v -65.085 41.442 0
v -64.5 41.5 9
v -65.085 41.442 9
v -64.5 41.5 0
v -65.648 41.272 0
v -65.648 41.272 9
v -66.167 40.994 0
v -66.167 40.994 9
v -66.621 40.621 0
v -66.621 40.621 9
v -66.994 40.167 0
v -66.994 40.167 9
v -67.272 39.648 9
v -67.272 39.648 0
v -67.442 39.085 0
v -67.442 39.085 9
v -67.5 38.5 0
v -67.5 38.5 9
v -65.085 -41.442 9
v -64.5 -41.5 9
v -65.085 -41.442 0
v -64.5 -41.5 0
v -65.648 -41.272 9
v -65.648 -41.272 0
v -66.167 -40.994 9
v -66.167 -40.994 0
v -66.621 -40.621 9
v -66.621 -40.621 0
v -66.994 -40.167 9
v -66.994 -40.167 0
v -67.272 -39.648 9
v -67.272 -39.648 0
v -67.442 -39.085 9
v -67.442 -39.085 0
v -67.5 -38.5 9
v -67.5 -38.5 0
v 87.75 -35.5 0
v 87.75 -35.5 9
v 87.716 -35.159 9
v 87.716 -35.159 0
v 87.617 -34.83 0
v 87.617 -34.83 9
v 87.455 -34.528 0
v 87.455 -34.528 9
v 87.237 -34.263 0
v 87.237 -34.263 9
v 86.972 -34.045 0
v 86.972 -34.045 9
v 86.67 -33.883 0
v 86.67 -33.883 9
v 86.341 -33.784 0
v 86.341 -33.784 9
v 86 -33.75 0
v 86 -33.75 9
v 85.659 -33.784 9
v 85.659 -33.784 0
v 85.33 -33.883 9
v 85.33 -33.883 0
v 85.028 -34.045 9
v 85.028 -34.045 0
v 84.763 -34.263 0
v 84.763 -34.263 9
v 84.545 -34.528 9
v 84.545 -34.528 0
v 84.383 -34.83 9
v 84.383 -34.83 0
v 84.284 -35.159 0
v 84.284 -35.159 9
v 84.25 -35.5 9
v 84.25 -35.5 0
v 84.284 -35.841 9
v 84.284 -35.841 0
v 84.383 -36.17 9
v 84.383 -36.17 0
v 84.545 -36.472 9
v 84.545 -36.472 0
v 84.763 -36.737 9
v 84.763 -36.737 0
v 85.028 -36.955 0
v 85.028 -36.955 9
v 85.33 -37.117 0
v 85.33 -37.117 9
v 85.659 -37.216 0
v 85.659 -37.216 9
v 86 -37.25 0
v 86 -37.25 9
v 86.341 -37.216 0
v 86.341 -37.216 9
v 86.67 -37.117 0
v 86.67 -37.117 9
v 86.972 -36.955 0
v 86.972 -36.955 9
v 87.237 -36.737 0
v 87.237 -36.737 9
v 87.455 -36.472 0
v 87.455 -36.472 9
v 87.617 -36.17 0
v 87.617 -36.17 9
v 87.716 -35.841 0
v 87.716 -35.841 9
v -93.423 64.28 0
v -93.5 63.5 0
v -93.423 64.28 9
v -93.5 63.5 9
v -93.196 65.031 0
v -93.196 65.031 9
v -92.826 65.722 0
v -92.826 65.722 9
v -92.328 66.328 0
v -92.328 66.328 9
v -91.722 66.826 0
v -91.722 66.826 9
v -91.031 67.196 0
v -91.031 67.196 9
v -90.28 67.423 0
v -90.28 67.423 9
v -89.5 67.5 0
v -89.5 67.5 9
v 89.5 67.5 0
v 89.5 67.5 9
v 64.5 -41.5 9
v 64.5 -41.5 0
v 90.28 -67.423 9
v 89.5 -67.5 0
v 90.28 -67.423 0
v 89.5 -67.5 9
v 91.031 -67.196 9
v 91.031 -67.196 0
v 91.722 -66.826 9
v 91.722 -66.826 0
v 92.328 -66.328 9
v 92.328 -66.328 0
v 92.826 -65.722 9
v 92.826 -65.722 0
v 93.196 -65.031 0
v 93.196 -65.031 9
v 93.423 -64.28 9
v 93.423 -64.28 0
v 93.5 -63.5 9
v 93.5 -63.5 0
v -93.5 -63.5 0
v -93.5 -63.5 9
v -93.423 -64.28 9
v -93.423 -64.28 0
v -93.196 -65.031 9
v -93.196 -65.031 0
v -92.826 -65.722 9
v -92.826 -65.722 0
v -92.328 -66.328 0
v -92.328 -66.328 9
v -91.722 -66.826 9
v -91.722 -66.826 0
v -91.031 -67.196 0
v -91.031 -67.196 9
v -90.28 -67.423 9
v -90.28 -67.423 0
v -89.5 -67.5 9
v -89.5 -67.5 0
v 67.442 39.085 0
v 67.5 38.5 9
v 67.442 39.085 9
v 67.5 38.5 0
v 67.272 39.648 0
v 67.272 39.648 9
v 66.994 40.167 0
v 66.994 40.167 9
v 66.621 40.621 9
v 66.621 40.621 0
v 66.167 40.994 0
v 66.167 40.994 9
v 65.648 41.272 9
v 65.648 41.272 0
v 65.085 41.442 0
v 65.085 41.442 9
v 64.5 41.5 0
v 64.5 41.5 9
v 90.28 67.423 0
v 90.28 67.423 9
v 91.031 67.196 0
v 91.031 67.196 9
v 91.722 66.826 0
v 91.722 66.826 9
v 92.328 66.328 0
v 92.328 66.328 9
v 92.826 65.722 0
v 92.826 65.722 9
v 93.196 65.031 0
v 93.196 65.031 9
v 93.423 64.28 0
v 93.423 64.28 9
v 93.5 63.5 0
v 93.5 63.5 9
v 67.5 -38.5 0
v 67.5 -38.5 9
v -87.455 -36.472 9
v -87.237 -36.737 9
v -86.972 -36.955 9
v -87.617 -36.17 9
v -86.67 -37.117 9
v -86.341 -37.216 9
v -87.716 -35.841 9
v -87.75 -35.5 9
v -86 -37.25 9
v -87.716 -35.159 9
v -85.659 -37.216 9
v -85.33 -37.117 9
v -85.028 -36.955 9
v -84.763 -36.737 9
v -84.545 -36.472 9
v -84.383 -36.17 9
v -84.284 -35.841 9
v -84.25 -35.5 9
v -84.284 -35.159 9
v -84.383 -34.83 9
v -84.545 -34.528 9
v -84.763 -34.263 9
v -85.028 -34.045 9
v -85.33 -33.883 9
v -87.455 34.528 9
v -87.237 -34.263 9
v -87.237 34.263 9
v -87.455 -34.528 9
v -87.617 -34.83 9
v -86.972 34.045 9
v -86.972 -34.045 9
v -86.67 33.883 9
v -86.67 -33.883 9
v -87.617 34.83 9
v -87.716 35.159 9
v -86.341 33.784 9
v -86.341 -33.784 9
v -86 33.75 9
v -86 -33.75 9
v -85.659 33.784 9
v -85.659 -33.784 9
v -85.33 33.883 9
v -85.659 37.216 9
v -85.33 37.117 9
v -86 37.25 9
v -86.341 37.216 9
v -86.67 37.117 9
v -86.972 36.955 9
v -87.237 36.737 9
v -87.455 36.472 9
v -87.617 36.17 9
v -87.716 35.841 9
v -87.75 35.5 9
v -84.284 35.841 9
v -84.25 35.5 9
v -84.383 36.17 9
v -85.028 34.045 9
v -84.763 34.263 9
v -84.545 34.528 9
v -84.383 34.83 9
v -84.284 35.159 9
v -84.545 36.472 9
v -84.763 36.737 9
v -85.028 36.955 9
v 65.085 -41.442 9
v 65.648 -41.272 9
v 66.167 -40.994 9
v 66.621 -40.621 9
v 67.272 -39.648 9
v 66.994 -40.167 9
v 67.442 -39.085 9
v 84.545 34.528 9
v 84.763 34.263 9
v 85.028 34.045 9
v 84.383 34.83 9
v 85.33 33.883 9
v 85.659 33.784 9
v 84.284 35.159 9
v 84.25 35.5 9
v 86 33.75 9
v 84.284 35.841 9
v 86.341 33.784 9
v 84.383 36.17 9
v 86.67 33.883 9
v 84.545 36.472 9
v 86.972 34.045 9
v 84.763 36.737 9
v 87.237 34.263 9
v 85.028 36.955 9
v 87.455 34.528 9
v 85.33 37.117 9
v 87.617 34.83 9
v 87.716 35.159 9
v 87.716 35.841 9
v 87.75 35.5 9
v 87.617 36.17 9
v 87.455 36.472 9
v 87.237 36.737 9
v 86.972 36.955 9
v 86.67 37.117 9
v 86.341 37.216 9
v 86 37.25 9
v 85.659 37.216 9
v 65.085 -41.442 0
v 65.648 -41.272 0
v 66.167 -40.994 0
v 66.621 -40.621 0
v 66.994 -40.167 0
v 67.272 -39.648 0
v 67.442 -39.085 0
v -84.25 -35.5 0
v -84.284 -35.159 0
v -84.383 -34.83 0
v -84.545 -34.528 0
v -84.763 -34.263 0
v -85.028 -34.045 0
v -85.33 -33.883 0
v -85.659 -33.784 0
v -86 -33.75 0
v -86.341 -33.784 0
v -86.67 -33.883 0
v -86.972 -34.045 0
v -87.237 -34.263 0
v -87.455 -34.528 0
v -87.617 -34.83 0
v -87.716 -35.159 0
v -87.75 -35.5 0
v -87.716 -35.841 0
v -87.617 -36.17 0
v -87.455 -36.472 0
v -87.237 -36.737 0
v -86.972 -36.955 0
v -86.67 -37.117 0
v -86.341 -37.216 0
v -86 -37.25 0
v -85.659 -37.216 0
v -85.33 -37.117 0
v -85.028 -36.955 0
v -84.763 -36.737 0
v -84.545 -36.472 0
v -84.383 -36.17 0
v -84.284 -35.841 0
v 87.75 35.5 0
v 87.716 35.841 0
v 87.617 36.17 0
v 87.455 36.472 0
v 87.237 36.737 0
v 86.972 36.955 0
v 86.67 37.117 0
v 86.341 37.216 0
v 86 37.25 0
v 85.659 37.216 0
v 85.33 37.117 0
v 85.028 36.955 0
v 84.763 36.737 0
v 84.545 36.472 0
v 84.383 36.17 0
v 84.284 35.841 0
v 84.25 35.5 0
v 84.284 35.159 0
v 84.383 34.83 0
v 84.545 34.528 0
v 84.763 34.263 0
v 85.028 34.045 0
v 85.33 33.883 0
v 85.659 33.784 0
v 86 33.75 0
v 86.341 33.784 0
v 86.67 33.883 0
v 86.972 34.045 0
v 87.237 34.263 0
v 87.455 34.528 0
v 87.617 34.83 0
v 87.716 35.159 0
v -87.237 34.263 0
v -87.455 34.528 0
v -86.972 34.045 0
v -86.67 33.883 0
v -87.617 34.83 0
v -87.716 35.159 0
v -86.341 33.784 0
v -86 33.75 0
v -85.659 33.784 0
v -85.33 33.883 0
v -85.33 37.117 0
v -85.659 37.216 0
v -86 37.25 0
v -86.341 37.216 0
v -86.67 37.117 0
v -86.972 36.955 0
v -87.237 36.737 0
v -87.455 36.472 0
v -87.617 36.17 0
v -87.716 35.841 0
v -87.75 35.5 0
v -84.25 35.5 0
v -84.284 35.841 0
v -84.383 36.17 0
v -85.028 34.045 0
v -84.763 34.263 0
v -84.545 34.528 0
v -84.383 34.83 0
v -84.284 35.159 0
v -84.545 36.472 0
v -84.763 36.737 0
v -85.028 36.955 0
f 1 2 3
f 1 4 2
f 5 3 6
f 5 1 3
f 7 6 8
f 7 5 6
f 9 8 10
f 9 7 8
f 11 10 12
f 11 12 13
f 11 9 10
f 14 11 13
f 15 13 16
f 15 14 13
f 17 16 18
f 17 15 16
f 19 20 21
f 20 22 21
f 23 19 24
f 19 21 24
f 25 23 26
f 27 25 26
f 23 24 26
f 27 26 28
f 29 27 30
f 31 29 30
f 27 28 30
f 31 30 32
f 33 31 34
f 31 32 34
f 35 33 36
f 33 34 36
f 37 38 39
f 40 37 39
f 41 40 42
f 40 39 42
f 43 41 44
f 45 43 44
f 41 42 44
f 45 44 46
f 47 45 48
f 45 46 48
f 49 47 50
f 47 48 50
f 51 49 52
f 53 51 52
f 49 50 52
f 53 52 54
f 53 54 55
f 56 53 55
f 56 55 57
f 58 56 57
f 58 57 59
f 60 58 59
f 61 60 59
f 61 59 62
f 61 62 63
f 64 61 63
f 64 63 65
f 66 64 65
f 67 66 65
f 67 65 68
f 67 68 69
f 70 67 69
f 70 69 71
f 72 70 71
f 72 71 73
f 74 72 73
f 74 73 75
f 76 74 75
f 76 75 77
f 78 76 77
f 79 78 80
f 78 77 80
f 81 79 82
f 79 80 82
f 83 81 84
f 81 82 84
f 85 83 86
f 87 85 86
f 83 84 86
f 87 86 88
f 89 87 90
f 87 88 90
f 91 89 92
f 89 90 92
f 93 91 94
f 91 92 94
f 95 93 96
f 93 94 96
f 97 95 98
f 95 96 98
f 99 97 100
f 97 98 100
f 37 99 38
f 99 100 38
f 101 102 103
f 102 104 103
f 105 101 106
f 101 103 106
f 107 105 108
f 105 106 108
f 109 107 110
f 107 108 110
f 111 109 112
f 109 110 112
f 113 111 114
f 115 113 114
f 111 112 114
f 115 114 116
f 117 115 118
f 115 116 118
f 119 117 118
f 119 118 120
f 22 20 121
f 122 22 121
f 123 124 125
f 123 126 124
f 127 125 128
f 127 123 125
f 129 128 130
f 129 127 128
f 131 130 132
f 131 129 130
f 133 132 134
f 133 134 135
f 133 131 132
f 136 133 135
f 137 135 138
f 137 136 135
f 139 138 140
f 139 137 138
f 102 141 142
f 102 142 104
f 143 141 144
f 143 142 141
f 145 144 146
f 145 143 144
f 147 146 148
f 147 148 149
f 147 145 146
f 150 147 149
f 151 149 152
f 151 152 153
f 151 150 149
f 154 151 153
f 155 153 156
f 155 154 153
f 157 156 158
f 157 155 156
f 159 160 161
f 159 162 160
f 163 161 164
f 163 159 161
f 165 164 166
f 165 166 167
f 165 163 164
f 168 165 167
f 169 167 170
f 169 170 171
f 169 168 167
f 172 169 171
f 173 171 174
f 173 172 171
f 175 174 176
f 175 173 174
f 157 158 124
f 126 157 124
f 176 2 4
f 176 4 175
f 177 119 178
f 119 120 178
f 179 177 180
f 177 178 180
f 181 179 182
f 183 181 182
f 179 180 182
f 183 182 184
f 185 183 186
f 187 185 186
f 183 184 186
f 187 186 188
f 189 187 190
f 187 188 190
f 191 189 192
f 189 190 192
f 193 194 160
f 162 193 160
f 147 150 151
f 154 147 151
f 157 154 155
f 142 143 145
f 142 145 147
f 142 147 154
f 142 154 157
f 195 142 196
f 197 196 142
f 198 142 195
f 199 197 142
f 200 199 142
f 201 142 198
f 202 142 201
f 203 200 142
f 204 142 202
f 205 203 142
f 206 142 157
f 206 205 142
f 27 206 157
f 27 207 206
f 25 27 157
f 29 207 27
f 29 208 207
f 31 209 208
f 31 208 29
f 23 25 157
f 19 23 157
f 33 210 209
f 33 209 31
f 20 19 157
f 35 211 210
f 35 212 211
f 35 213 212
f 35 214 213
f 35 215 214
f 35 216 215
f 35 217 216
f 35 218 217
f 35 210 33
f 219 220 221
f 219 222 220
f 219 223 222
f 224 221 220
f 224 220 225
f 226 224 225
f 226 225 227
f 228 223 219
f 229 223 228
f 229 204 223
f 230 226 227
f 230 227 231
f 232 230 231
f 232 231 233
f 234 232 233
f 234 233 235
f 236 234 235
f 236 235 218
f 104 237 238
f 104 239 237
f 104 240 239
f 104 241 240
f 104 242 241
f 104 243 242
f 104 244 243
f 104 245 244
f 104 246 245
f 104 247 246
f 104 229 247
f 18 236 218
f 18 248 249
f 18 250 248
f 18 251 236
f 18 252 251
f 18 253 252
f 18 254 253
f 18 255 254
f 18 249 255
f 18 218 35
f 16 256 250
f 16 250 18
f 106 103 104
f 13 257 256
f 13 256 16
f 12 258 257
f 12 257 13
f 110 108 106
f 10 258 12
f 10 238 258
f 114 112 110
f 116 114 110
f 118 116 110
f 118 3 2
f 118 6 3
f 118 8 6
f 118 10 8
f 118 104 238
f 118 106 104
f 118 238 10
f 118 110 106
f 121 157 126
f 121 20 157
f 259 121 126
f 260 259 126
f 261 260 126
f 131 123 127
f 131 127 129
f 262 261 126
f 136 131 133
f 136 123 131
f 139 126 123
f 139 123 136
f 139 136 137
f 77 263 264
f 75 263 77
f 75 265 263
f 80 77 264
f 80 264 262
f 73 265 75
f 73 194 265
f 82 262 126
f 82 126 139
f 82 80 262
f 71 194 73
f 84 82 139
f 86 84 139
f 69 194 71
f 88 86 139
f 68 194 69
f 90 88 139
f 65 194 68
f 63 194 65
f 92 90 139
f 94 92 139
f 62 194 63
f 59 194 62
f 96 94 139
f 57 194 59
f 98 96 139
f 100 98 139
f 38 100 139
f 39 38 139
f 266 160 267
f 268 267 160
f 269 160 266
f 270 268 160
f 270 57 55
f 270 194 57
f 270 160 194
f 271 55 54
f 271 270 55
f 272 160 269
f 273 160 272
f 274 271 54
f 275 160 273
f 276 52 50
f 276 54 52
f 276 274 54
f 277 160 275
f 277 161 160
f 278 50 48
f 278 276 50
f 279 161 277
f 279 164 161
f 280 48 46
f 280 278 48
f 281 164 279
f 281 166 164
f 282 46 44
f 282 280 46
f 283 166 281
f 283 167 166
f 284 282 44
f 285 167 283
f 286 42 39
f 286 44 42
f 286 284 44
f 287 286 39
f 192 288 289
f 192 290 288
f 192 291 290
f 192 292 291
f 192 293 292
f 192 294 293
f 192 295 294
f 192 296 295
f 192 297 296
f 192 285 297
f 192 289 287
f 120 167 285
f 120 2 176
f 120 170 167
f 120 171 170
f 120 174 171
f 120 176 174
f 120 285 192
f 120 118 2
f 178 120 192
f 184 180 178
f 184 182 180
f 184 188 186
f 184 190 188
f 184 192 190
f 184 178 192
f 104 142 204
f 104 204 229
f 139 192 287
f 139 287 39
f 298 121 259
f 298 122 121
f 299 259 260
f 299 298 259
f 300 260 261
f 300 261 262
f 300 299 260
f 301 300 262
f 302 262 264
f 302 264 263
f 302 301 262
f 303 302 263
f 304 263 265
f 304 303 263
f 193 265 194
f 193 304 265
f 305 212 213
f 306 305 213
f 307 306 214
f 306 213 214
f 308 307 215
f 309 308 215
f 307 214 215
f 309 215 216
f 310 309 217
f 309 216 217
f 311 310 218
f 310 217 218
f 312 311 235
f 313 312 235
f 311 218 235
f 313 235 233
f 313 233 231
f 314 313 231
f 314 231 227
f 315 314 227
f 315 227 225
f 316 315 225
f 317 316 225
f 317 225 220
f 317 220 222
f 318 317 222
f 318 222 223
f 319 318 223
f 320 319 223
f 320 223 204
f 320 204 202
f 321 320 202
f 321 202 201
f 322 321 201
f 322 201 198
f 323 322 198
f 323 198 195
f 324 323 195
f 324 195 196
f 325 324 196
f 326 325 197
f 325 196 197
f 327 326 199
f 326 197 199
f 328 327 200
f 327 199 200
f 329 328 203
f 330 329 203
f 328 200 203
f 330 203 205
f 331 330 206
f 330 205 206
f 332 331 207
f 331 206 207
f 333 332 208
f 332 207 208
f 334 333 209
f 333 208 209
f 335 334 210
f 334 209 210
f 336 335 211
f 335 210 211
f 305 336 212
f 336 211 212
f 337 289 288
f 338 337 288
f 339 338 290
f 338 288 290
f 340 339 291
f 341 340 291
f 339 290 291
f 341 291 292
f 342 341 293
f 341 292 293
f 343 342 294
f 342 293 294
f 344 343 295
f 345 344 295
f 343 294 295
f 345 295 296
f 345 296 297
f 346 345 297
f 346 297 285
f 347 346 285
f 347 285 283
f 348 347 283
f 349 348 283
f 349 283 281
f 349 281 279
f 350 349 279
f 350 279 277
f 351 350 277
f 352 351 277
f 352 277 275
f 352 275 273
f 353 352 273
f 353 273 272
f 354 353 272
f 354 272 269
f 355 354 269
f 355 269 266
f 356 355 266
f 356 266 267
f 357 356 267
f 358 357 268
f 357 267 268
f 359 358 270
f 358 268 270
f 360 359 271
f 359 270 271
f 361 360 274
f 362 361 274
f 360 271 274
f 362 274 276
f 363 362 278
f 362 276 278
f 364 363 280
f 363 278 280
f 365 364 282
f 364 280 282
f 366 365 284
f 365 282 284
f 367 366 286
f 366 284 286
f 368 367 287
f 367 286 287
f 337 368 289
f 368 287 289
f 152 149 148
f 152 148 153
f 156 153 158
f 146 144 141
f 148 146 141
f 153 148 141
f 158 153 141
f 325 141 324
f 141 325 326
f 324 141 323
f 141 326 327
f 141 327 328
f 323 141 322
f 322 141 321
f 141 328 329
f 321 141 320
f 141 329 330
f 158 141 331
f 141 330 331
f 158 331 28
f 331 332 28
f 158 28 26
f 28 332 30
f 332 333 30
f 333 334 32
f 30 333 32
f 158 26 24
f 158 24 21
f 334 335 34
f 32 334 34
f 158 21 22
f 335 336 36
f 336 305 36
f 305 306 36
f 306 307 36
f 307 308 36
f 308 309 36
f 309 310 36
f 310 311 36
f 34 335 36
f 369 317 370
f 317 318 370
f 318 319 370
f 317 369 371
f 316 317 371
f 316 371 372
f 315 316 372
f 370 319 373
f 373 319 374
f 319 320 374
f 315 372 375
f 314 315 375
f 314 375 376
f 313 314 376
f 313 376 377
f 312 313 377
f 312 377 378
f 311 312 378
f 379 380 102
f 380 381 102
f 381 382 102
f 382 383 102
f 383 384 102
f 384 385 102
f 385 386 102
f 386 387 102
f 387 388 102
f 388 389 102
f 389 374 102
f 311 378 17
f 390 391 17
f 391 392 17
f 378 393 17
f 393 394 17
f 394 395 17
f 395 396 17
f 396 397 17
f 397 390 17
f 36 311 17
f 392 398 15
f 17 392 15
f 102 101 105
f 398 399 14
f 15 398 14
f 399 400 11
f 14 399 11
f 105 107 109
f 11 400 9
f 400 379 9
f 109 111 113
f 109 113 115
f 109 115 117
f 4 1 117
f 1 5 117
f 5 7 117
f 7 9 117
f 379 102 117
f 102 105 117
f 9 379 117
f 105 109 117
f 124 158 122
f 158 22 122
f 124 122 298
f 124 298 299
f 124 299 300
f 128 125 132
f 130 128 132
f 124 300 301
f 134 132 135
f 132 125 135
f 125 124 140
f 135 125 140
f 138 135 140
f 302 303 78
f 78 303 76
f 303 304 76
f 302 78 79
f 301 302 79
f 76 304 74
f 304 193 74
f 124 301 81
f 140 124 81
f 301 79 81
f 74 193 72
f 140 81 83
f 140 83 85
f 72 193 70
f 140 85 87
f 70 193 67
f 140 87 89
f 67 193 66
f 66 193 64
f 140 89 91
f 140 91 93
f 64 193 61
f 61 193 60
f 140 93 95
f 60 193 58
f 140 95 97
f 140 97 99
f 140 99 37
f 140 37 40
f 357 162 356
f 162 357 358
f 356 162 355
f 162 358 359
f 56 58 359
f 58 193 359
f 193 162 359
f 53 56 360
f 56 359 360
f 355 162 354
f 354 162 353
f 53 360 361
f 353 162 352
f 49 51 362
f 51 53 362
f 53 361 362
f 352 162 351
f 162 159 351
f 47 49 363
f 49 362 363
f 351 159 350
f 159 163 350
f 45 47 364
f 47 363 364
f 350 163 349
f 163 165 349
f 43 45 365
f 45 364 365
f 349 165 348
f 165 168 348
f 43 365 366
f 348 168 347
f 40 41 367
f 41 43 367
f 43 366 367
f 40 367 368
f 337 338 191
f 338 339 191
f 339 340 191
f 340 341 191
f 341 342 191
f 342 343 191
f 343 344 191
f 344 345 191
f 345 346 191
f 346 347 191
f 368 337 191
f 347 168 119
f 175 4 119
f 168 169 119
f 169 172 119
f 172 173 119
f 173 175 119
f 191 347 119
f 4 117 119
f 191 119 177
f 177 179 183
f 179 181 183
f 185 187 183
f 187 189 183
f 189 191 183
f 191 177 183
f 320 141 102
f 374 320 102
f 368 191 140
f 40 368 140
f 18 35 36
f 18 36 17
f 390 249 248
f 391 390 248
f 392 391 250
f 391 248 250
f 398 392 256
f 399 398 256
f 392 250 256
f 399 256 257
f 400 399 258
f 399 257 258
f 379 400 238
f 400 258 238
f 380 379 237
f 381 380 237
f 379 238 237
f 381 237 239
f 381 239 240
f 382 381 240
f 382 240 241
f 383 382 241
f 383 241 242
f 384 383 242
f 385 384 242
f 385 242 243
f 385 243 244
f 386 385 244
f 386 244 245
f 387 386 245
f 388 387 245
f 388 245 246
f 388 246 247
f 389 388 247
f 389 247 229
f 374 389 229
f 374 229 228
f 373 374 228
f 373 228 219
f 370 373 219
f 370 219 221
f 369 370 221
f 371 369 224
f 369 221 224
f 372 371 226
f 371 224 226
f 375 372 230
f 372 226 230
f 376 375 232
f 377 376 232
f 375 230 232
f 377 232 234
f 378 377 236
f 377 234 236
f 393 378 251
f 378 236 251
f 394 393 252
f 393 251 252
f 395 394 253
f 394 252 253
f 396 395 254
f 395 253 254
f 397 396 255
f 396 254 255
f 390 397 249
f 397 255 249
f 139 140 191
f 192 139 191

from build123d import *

# Parameters (mm, degrees)
SKETCH_W        = 187
SKETCH_H        = 135
PAD_DEPTH       = 9
SKETCH001_R     = 1.75
POCKET_DEPTH    = 9.001
FILLET_R        = 4
SKETCH002_W     = 135
SKETCH002_H     = 83
POCKET001_DEPTH = 9.001
FILLET001_R     = 3


with BuildPart() as part:
    # Sketch → Pad (new body)
    with BuildSketch(Plane.XY):
        Rectangle(SKETCH_W, SKETCH_H)
    extrude(amount=PAD_DEPTH)

    # Sketch001 (on Face6 of Pad) → Pocket (cut, through all)
    with BuildSketch(Plane.XY.offset(9)):
        with Locations((-86, 35.5)):
            Circle(SKETCH001_R)
        with Locations((86, 35.5)):
            Circle(SKETCH001_R)
        with Locations((-86, -35.5)):
            Circle(SKETCH001_R)
        with Locations((86, -35.5)):
            Circle(SKETCH001_R)
    extrude(amount=-POCKET_DEPTH, mode=Mode.SUBTRACT)

    # Fillet
    fillet_edges = [part.edges().sort_by_distance(p)[0] for p in [
        (-93.5, 67.5, 4.5),
        (-93.5, -67.5, 4.5),
        (93.5, -67.5, 4.5),
        (93.5, 67.5, 4.5),
    ]]
    fillet(fillet_edges, radius=FILLET_R)

    # Sketch002 (on Face5 of Fillet) → Pocket001 (cut, through all)
    with BuildSketch(Plane.XY.offset(9)):
        Rectangle(SKETCH002_W, SKETCH002_H)
    extrude(amount=-POCKET001_DEPTH, mode=Mode.SUBTRACT)

    # Fillet001
    fillet001_edges = [part.edges().sort_by_distance(p)[0] for p in [
        (-67.5, 41.5, 4.5),
        (-67.5, -41.5, 4.5),
        (67.5, -41.5, 4.5),
        (67.5, 41.5, 4.5),
    ]]
    fillet(fillet001_edges, radius=FILLET001_R)


solid = part.part
